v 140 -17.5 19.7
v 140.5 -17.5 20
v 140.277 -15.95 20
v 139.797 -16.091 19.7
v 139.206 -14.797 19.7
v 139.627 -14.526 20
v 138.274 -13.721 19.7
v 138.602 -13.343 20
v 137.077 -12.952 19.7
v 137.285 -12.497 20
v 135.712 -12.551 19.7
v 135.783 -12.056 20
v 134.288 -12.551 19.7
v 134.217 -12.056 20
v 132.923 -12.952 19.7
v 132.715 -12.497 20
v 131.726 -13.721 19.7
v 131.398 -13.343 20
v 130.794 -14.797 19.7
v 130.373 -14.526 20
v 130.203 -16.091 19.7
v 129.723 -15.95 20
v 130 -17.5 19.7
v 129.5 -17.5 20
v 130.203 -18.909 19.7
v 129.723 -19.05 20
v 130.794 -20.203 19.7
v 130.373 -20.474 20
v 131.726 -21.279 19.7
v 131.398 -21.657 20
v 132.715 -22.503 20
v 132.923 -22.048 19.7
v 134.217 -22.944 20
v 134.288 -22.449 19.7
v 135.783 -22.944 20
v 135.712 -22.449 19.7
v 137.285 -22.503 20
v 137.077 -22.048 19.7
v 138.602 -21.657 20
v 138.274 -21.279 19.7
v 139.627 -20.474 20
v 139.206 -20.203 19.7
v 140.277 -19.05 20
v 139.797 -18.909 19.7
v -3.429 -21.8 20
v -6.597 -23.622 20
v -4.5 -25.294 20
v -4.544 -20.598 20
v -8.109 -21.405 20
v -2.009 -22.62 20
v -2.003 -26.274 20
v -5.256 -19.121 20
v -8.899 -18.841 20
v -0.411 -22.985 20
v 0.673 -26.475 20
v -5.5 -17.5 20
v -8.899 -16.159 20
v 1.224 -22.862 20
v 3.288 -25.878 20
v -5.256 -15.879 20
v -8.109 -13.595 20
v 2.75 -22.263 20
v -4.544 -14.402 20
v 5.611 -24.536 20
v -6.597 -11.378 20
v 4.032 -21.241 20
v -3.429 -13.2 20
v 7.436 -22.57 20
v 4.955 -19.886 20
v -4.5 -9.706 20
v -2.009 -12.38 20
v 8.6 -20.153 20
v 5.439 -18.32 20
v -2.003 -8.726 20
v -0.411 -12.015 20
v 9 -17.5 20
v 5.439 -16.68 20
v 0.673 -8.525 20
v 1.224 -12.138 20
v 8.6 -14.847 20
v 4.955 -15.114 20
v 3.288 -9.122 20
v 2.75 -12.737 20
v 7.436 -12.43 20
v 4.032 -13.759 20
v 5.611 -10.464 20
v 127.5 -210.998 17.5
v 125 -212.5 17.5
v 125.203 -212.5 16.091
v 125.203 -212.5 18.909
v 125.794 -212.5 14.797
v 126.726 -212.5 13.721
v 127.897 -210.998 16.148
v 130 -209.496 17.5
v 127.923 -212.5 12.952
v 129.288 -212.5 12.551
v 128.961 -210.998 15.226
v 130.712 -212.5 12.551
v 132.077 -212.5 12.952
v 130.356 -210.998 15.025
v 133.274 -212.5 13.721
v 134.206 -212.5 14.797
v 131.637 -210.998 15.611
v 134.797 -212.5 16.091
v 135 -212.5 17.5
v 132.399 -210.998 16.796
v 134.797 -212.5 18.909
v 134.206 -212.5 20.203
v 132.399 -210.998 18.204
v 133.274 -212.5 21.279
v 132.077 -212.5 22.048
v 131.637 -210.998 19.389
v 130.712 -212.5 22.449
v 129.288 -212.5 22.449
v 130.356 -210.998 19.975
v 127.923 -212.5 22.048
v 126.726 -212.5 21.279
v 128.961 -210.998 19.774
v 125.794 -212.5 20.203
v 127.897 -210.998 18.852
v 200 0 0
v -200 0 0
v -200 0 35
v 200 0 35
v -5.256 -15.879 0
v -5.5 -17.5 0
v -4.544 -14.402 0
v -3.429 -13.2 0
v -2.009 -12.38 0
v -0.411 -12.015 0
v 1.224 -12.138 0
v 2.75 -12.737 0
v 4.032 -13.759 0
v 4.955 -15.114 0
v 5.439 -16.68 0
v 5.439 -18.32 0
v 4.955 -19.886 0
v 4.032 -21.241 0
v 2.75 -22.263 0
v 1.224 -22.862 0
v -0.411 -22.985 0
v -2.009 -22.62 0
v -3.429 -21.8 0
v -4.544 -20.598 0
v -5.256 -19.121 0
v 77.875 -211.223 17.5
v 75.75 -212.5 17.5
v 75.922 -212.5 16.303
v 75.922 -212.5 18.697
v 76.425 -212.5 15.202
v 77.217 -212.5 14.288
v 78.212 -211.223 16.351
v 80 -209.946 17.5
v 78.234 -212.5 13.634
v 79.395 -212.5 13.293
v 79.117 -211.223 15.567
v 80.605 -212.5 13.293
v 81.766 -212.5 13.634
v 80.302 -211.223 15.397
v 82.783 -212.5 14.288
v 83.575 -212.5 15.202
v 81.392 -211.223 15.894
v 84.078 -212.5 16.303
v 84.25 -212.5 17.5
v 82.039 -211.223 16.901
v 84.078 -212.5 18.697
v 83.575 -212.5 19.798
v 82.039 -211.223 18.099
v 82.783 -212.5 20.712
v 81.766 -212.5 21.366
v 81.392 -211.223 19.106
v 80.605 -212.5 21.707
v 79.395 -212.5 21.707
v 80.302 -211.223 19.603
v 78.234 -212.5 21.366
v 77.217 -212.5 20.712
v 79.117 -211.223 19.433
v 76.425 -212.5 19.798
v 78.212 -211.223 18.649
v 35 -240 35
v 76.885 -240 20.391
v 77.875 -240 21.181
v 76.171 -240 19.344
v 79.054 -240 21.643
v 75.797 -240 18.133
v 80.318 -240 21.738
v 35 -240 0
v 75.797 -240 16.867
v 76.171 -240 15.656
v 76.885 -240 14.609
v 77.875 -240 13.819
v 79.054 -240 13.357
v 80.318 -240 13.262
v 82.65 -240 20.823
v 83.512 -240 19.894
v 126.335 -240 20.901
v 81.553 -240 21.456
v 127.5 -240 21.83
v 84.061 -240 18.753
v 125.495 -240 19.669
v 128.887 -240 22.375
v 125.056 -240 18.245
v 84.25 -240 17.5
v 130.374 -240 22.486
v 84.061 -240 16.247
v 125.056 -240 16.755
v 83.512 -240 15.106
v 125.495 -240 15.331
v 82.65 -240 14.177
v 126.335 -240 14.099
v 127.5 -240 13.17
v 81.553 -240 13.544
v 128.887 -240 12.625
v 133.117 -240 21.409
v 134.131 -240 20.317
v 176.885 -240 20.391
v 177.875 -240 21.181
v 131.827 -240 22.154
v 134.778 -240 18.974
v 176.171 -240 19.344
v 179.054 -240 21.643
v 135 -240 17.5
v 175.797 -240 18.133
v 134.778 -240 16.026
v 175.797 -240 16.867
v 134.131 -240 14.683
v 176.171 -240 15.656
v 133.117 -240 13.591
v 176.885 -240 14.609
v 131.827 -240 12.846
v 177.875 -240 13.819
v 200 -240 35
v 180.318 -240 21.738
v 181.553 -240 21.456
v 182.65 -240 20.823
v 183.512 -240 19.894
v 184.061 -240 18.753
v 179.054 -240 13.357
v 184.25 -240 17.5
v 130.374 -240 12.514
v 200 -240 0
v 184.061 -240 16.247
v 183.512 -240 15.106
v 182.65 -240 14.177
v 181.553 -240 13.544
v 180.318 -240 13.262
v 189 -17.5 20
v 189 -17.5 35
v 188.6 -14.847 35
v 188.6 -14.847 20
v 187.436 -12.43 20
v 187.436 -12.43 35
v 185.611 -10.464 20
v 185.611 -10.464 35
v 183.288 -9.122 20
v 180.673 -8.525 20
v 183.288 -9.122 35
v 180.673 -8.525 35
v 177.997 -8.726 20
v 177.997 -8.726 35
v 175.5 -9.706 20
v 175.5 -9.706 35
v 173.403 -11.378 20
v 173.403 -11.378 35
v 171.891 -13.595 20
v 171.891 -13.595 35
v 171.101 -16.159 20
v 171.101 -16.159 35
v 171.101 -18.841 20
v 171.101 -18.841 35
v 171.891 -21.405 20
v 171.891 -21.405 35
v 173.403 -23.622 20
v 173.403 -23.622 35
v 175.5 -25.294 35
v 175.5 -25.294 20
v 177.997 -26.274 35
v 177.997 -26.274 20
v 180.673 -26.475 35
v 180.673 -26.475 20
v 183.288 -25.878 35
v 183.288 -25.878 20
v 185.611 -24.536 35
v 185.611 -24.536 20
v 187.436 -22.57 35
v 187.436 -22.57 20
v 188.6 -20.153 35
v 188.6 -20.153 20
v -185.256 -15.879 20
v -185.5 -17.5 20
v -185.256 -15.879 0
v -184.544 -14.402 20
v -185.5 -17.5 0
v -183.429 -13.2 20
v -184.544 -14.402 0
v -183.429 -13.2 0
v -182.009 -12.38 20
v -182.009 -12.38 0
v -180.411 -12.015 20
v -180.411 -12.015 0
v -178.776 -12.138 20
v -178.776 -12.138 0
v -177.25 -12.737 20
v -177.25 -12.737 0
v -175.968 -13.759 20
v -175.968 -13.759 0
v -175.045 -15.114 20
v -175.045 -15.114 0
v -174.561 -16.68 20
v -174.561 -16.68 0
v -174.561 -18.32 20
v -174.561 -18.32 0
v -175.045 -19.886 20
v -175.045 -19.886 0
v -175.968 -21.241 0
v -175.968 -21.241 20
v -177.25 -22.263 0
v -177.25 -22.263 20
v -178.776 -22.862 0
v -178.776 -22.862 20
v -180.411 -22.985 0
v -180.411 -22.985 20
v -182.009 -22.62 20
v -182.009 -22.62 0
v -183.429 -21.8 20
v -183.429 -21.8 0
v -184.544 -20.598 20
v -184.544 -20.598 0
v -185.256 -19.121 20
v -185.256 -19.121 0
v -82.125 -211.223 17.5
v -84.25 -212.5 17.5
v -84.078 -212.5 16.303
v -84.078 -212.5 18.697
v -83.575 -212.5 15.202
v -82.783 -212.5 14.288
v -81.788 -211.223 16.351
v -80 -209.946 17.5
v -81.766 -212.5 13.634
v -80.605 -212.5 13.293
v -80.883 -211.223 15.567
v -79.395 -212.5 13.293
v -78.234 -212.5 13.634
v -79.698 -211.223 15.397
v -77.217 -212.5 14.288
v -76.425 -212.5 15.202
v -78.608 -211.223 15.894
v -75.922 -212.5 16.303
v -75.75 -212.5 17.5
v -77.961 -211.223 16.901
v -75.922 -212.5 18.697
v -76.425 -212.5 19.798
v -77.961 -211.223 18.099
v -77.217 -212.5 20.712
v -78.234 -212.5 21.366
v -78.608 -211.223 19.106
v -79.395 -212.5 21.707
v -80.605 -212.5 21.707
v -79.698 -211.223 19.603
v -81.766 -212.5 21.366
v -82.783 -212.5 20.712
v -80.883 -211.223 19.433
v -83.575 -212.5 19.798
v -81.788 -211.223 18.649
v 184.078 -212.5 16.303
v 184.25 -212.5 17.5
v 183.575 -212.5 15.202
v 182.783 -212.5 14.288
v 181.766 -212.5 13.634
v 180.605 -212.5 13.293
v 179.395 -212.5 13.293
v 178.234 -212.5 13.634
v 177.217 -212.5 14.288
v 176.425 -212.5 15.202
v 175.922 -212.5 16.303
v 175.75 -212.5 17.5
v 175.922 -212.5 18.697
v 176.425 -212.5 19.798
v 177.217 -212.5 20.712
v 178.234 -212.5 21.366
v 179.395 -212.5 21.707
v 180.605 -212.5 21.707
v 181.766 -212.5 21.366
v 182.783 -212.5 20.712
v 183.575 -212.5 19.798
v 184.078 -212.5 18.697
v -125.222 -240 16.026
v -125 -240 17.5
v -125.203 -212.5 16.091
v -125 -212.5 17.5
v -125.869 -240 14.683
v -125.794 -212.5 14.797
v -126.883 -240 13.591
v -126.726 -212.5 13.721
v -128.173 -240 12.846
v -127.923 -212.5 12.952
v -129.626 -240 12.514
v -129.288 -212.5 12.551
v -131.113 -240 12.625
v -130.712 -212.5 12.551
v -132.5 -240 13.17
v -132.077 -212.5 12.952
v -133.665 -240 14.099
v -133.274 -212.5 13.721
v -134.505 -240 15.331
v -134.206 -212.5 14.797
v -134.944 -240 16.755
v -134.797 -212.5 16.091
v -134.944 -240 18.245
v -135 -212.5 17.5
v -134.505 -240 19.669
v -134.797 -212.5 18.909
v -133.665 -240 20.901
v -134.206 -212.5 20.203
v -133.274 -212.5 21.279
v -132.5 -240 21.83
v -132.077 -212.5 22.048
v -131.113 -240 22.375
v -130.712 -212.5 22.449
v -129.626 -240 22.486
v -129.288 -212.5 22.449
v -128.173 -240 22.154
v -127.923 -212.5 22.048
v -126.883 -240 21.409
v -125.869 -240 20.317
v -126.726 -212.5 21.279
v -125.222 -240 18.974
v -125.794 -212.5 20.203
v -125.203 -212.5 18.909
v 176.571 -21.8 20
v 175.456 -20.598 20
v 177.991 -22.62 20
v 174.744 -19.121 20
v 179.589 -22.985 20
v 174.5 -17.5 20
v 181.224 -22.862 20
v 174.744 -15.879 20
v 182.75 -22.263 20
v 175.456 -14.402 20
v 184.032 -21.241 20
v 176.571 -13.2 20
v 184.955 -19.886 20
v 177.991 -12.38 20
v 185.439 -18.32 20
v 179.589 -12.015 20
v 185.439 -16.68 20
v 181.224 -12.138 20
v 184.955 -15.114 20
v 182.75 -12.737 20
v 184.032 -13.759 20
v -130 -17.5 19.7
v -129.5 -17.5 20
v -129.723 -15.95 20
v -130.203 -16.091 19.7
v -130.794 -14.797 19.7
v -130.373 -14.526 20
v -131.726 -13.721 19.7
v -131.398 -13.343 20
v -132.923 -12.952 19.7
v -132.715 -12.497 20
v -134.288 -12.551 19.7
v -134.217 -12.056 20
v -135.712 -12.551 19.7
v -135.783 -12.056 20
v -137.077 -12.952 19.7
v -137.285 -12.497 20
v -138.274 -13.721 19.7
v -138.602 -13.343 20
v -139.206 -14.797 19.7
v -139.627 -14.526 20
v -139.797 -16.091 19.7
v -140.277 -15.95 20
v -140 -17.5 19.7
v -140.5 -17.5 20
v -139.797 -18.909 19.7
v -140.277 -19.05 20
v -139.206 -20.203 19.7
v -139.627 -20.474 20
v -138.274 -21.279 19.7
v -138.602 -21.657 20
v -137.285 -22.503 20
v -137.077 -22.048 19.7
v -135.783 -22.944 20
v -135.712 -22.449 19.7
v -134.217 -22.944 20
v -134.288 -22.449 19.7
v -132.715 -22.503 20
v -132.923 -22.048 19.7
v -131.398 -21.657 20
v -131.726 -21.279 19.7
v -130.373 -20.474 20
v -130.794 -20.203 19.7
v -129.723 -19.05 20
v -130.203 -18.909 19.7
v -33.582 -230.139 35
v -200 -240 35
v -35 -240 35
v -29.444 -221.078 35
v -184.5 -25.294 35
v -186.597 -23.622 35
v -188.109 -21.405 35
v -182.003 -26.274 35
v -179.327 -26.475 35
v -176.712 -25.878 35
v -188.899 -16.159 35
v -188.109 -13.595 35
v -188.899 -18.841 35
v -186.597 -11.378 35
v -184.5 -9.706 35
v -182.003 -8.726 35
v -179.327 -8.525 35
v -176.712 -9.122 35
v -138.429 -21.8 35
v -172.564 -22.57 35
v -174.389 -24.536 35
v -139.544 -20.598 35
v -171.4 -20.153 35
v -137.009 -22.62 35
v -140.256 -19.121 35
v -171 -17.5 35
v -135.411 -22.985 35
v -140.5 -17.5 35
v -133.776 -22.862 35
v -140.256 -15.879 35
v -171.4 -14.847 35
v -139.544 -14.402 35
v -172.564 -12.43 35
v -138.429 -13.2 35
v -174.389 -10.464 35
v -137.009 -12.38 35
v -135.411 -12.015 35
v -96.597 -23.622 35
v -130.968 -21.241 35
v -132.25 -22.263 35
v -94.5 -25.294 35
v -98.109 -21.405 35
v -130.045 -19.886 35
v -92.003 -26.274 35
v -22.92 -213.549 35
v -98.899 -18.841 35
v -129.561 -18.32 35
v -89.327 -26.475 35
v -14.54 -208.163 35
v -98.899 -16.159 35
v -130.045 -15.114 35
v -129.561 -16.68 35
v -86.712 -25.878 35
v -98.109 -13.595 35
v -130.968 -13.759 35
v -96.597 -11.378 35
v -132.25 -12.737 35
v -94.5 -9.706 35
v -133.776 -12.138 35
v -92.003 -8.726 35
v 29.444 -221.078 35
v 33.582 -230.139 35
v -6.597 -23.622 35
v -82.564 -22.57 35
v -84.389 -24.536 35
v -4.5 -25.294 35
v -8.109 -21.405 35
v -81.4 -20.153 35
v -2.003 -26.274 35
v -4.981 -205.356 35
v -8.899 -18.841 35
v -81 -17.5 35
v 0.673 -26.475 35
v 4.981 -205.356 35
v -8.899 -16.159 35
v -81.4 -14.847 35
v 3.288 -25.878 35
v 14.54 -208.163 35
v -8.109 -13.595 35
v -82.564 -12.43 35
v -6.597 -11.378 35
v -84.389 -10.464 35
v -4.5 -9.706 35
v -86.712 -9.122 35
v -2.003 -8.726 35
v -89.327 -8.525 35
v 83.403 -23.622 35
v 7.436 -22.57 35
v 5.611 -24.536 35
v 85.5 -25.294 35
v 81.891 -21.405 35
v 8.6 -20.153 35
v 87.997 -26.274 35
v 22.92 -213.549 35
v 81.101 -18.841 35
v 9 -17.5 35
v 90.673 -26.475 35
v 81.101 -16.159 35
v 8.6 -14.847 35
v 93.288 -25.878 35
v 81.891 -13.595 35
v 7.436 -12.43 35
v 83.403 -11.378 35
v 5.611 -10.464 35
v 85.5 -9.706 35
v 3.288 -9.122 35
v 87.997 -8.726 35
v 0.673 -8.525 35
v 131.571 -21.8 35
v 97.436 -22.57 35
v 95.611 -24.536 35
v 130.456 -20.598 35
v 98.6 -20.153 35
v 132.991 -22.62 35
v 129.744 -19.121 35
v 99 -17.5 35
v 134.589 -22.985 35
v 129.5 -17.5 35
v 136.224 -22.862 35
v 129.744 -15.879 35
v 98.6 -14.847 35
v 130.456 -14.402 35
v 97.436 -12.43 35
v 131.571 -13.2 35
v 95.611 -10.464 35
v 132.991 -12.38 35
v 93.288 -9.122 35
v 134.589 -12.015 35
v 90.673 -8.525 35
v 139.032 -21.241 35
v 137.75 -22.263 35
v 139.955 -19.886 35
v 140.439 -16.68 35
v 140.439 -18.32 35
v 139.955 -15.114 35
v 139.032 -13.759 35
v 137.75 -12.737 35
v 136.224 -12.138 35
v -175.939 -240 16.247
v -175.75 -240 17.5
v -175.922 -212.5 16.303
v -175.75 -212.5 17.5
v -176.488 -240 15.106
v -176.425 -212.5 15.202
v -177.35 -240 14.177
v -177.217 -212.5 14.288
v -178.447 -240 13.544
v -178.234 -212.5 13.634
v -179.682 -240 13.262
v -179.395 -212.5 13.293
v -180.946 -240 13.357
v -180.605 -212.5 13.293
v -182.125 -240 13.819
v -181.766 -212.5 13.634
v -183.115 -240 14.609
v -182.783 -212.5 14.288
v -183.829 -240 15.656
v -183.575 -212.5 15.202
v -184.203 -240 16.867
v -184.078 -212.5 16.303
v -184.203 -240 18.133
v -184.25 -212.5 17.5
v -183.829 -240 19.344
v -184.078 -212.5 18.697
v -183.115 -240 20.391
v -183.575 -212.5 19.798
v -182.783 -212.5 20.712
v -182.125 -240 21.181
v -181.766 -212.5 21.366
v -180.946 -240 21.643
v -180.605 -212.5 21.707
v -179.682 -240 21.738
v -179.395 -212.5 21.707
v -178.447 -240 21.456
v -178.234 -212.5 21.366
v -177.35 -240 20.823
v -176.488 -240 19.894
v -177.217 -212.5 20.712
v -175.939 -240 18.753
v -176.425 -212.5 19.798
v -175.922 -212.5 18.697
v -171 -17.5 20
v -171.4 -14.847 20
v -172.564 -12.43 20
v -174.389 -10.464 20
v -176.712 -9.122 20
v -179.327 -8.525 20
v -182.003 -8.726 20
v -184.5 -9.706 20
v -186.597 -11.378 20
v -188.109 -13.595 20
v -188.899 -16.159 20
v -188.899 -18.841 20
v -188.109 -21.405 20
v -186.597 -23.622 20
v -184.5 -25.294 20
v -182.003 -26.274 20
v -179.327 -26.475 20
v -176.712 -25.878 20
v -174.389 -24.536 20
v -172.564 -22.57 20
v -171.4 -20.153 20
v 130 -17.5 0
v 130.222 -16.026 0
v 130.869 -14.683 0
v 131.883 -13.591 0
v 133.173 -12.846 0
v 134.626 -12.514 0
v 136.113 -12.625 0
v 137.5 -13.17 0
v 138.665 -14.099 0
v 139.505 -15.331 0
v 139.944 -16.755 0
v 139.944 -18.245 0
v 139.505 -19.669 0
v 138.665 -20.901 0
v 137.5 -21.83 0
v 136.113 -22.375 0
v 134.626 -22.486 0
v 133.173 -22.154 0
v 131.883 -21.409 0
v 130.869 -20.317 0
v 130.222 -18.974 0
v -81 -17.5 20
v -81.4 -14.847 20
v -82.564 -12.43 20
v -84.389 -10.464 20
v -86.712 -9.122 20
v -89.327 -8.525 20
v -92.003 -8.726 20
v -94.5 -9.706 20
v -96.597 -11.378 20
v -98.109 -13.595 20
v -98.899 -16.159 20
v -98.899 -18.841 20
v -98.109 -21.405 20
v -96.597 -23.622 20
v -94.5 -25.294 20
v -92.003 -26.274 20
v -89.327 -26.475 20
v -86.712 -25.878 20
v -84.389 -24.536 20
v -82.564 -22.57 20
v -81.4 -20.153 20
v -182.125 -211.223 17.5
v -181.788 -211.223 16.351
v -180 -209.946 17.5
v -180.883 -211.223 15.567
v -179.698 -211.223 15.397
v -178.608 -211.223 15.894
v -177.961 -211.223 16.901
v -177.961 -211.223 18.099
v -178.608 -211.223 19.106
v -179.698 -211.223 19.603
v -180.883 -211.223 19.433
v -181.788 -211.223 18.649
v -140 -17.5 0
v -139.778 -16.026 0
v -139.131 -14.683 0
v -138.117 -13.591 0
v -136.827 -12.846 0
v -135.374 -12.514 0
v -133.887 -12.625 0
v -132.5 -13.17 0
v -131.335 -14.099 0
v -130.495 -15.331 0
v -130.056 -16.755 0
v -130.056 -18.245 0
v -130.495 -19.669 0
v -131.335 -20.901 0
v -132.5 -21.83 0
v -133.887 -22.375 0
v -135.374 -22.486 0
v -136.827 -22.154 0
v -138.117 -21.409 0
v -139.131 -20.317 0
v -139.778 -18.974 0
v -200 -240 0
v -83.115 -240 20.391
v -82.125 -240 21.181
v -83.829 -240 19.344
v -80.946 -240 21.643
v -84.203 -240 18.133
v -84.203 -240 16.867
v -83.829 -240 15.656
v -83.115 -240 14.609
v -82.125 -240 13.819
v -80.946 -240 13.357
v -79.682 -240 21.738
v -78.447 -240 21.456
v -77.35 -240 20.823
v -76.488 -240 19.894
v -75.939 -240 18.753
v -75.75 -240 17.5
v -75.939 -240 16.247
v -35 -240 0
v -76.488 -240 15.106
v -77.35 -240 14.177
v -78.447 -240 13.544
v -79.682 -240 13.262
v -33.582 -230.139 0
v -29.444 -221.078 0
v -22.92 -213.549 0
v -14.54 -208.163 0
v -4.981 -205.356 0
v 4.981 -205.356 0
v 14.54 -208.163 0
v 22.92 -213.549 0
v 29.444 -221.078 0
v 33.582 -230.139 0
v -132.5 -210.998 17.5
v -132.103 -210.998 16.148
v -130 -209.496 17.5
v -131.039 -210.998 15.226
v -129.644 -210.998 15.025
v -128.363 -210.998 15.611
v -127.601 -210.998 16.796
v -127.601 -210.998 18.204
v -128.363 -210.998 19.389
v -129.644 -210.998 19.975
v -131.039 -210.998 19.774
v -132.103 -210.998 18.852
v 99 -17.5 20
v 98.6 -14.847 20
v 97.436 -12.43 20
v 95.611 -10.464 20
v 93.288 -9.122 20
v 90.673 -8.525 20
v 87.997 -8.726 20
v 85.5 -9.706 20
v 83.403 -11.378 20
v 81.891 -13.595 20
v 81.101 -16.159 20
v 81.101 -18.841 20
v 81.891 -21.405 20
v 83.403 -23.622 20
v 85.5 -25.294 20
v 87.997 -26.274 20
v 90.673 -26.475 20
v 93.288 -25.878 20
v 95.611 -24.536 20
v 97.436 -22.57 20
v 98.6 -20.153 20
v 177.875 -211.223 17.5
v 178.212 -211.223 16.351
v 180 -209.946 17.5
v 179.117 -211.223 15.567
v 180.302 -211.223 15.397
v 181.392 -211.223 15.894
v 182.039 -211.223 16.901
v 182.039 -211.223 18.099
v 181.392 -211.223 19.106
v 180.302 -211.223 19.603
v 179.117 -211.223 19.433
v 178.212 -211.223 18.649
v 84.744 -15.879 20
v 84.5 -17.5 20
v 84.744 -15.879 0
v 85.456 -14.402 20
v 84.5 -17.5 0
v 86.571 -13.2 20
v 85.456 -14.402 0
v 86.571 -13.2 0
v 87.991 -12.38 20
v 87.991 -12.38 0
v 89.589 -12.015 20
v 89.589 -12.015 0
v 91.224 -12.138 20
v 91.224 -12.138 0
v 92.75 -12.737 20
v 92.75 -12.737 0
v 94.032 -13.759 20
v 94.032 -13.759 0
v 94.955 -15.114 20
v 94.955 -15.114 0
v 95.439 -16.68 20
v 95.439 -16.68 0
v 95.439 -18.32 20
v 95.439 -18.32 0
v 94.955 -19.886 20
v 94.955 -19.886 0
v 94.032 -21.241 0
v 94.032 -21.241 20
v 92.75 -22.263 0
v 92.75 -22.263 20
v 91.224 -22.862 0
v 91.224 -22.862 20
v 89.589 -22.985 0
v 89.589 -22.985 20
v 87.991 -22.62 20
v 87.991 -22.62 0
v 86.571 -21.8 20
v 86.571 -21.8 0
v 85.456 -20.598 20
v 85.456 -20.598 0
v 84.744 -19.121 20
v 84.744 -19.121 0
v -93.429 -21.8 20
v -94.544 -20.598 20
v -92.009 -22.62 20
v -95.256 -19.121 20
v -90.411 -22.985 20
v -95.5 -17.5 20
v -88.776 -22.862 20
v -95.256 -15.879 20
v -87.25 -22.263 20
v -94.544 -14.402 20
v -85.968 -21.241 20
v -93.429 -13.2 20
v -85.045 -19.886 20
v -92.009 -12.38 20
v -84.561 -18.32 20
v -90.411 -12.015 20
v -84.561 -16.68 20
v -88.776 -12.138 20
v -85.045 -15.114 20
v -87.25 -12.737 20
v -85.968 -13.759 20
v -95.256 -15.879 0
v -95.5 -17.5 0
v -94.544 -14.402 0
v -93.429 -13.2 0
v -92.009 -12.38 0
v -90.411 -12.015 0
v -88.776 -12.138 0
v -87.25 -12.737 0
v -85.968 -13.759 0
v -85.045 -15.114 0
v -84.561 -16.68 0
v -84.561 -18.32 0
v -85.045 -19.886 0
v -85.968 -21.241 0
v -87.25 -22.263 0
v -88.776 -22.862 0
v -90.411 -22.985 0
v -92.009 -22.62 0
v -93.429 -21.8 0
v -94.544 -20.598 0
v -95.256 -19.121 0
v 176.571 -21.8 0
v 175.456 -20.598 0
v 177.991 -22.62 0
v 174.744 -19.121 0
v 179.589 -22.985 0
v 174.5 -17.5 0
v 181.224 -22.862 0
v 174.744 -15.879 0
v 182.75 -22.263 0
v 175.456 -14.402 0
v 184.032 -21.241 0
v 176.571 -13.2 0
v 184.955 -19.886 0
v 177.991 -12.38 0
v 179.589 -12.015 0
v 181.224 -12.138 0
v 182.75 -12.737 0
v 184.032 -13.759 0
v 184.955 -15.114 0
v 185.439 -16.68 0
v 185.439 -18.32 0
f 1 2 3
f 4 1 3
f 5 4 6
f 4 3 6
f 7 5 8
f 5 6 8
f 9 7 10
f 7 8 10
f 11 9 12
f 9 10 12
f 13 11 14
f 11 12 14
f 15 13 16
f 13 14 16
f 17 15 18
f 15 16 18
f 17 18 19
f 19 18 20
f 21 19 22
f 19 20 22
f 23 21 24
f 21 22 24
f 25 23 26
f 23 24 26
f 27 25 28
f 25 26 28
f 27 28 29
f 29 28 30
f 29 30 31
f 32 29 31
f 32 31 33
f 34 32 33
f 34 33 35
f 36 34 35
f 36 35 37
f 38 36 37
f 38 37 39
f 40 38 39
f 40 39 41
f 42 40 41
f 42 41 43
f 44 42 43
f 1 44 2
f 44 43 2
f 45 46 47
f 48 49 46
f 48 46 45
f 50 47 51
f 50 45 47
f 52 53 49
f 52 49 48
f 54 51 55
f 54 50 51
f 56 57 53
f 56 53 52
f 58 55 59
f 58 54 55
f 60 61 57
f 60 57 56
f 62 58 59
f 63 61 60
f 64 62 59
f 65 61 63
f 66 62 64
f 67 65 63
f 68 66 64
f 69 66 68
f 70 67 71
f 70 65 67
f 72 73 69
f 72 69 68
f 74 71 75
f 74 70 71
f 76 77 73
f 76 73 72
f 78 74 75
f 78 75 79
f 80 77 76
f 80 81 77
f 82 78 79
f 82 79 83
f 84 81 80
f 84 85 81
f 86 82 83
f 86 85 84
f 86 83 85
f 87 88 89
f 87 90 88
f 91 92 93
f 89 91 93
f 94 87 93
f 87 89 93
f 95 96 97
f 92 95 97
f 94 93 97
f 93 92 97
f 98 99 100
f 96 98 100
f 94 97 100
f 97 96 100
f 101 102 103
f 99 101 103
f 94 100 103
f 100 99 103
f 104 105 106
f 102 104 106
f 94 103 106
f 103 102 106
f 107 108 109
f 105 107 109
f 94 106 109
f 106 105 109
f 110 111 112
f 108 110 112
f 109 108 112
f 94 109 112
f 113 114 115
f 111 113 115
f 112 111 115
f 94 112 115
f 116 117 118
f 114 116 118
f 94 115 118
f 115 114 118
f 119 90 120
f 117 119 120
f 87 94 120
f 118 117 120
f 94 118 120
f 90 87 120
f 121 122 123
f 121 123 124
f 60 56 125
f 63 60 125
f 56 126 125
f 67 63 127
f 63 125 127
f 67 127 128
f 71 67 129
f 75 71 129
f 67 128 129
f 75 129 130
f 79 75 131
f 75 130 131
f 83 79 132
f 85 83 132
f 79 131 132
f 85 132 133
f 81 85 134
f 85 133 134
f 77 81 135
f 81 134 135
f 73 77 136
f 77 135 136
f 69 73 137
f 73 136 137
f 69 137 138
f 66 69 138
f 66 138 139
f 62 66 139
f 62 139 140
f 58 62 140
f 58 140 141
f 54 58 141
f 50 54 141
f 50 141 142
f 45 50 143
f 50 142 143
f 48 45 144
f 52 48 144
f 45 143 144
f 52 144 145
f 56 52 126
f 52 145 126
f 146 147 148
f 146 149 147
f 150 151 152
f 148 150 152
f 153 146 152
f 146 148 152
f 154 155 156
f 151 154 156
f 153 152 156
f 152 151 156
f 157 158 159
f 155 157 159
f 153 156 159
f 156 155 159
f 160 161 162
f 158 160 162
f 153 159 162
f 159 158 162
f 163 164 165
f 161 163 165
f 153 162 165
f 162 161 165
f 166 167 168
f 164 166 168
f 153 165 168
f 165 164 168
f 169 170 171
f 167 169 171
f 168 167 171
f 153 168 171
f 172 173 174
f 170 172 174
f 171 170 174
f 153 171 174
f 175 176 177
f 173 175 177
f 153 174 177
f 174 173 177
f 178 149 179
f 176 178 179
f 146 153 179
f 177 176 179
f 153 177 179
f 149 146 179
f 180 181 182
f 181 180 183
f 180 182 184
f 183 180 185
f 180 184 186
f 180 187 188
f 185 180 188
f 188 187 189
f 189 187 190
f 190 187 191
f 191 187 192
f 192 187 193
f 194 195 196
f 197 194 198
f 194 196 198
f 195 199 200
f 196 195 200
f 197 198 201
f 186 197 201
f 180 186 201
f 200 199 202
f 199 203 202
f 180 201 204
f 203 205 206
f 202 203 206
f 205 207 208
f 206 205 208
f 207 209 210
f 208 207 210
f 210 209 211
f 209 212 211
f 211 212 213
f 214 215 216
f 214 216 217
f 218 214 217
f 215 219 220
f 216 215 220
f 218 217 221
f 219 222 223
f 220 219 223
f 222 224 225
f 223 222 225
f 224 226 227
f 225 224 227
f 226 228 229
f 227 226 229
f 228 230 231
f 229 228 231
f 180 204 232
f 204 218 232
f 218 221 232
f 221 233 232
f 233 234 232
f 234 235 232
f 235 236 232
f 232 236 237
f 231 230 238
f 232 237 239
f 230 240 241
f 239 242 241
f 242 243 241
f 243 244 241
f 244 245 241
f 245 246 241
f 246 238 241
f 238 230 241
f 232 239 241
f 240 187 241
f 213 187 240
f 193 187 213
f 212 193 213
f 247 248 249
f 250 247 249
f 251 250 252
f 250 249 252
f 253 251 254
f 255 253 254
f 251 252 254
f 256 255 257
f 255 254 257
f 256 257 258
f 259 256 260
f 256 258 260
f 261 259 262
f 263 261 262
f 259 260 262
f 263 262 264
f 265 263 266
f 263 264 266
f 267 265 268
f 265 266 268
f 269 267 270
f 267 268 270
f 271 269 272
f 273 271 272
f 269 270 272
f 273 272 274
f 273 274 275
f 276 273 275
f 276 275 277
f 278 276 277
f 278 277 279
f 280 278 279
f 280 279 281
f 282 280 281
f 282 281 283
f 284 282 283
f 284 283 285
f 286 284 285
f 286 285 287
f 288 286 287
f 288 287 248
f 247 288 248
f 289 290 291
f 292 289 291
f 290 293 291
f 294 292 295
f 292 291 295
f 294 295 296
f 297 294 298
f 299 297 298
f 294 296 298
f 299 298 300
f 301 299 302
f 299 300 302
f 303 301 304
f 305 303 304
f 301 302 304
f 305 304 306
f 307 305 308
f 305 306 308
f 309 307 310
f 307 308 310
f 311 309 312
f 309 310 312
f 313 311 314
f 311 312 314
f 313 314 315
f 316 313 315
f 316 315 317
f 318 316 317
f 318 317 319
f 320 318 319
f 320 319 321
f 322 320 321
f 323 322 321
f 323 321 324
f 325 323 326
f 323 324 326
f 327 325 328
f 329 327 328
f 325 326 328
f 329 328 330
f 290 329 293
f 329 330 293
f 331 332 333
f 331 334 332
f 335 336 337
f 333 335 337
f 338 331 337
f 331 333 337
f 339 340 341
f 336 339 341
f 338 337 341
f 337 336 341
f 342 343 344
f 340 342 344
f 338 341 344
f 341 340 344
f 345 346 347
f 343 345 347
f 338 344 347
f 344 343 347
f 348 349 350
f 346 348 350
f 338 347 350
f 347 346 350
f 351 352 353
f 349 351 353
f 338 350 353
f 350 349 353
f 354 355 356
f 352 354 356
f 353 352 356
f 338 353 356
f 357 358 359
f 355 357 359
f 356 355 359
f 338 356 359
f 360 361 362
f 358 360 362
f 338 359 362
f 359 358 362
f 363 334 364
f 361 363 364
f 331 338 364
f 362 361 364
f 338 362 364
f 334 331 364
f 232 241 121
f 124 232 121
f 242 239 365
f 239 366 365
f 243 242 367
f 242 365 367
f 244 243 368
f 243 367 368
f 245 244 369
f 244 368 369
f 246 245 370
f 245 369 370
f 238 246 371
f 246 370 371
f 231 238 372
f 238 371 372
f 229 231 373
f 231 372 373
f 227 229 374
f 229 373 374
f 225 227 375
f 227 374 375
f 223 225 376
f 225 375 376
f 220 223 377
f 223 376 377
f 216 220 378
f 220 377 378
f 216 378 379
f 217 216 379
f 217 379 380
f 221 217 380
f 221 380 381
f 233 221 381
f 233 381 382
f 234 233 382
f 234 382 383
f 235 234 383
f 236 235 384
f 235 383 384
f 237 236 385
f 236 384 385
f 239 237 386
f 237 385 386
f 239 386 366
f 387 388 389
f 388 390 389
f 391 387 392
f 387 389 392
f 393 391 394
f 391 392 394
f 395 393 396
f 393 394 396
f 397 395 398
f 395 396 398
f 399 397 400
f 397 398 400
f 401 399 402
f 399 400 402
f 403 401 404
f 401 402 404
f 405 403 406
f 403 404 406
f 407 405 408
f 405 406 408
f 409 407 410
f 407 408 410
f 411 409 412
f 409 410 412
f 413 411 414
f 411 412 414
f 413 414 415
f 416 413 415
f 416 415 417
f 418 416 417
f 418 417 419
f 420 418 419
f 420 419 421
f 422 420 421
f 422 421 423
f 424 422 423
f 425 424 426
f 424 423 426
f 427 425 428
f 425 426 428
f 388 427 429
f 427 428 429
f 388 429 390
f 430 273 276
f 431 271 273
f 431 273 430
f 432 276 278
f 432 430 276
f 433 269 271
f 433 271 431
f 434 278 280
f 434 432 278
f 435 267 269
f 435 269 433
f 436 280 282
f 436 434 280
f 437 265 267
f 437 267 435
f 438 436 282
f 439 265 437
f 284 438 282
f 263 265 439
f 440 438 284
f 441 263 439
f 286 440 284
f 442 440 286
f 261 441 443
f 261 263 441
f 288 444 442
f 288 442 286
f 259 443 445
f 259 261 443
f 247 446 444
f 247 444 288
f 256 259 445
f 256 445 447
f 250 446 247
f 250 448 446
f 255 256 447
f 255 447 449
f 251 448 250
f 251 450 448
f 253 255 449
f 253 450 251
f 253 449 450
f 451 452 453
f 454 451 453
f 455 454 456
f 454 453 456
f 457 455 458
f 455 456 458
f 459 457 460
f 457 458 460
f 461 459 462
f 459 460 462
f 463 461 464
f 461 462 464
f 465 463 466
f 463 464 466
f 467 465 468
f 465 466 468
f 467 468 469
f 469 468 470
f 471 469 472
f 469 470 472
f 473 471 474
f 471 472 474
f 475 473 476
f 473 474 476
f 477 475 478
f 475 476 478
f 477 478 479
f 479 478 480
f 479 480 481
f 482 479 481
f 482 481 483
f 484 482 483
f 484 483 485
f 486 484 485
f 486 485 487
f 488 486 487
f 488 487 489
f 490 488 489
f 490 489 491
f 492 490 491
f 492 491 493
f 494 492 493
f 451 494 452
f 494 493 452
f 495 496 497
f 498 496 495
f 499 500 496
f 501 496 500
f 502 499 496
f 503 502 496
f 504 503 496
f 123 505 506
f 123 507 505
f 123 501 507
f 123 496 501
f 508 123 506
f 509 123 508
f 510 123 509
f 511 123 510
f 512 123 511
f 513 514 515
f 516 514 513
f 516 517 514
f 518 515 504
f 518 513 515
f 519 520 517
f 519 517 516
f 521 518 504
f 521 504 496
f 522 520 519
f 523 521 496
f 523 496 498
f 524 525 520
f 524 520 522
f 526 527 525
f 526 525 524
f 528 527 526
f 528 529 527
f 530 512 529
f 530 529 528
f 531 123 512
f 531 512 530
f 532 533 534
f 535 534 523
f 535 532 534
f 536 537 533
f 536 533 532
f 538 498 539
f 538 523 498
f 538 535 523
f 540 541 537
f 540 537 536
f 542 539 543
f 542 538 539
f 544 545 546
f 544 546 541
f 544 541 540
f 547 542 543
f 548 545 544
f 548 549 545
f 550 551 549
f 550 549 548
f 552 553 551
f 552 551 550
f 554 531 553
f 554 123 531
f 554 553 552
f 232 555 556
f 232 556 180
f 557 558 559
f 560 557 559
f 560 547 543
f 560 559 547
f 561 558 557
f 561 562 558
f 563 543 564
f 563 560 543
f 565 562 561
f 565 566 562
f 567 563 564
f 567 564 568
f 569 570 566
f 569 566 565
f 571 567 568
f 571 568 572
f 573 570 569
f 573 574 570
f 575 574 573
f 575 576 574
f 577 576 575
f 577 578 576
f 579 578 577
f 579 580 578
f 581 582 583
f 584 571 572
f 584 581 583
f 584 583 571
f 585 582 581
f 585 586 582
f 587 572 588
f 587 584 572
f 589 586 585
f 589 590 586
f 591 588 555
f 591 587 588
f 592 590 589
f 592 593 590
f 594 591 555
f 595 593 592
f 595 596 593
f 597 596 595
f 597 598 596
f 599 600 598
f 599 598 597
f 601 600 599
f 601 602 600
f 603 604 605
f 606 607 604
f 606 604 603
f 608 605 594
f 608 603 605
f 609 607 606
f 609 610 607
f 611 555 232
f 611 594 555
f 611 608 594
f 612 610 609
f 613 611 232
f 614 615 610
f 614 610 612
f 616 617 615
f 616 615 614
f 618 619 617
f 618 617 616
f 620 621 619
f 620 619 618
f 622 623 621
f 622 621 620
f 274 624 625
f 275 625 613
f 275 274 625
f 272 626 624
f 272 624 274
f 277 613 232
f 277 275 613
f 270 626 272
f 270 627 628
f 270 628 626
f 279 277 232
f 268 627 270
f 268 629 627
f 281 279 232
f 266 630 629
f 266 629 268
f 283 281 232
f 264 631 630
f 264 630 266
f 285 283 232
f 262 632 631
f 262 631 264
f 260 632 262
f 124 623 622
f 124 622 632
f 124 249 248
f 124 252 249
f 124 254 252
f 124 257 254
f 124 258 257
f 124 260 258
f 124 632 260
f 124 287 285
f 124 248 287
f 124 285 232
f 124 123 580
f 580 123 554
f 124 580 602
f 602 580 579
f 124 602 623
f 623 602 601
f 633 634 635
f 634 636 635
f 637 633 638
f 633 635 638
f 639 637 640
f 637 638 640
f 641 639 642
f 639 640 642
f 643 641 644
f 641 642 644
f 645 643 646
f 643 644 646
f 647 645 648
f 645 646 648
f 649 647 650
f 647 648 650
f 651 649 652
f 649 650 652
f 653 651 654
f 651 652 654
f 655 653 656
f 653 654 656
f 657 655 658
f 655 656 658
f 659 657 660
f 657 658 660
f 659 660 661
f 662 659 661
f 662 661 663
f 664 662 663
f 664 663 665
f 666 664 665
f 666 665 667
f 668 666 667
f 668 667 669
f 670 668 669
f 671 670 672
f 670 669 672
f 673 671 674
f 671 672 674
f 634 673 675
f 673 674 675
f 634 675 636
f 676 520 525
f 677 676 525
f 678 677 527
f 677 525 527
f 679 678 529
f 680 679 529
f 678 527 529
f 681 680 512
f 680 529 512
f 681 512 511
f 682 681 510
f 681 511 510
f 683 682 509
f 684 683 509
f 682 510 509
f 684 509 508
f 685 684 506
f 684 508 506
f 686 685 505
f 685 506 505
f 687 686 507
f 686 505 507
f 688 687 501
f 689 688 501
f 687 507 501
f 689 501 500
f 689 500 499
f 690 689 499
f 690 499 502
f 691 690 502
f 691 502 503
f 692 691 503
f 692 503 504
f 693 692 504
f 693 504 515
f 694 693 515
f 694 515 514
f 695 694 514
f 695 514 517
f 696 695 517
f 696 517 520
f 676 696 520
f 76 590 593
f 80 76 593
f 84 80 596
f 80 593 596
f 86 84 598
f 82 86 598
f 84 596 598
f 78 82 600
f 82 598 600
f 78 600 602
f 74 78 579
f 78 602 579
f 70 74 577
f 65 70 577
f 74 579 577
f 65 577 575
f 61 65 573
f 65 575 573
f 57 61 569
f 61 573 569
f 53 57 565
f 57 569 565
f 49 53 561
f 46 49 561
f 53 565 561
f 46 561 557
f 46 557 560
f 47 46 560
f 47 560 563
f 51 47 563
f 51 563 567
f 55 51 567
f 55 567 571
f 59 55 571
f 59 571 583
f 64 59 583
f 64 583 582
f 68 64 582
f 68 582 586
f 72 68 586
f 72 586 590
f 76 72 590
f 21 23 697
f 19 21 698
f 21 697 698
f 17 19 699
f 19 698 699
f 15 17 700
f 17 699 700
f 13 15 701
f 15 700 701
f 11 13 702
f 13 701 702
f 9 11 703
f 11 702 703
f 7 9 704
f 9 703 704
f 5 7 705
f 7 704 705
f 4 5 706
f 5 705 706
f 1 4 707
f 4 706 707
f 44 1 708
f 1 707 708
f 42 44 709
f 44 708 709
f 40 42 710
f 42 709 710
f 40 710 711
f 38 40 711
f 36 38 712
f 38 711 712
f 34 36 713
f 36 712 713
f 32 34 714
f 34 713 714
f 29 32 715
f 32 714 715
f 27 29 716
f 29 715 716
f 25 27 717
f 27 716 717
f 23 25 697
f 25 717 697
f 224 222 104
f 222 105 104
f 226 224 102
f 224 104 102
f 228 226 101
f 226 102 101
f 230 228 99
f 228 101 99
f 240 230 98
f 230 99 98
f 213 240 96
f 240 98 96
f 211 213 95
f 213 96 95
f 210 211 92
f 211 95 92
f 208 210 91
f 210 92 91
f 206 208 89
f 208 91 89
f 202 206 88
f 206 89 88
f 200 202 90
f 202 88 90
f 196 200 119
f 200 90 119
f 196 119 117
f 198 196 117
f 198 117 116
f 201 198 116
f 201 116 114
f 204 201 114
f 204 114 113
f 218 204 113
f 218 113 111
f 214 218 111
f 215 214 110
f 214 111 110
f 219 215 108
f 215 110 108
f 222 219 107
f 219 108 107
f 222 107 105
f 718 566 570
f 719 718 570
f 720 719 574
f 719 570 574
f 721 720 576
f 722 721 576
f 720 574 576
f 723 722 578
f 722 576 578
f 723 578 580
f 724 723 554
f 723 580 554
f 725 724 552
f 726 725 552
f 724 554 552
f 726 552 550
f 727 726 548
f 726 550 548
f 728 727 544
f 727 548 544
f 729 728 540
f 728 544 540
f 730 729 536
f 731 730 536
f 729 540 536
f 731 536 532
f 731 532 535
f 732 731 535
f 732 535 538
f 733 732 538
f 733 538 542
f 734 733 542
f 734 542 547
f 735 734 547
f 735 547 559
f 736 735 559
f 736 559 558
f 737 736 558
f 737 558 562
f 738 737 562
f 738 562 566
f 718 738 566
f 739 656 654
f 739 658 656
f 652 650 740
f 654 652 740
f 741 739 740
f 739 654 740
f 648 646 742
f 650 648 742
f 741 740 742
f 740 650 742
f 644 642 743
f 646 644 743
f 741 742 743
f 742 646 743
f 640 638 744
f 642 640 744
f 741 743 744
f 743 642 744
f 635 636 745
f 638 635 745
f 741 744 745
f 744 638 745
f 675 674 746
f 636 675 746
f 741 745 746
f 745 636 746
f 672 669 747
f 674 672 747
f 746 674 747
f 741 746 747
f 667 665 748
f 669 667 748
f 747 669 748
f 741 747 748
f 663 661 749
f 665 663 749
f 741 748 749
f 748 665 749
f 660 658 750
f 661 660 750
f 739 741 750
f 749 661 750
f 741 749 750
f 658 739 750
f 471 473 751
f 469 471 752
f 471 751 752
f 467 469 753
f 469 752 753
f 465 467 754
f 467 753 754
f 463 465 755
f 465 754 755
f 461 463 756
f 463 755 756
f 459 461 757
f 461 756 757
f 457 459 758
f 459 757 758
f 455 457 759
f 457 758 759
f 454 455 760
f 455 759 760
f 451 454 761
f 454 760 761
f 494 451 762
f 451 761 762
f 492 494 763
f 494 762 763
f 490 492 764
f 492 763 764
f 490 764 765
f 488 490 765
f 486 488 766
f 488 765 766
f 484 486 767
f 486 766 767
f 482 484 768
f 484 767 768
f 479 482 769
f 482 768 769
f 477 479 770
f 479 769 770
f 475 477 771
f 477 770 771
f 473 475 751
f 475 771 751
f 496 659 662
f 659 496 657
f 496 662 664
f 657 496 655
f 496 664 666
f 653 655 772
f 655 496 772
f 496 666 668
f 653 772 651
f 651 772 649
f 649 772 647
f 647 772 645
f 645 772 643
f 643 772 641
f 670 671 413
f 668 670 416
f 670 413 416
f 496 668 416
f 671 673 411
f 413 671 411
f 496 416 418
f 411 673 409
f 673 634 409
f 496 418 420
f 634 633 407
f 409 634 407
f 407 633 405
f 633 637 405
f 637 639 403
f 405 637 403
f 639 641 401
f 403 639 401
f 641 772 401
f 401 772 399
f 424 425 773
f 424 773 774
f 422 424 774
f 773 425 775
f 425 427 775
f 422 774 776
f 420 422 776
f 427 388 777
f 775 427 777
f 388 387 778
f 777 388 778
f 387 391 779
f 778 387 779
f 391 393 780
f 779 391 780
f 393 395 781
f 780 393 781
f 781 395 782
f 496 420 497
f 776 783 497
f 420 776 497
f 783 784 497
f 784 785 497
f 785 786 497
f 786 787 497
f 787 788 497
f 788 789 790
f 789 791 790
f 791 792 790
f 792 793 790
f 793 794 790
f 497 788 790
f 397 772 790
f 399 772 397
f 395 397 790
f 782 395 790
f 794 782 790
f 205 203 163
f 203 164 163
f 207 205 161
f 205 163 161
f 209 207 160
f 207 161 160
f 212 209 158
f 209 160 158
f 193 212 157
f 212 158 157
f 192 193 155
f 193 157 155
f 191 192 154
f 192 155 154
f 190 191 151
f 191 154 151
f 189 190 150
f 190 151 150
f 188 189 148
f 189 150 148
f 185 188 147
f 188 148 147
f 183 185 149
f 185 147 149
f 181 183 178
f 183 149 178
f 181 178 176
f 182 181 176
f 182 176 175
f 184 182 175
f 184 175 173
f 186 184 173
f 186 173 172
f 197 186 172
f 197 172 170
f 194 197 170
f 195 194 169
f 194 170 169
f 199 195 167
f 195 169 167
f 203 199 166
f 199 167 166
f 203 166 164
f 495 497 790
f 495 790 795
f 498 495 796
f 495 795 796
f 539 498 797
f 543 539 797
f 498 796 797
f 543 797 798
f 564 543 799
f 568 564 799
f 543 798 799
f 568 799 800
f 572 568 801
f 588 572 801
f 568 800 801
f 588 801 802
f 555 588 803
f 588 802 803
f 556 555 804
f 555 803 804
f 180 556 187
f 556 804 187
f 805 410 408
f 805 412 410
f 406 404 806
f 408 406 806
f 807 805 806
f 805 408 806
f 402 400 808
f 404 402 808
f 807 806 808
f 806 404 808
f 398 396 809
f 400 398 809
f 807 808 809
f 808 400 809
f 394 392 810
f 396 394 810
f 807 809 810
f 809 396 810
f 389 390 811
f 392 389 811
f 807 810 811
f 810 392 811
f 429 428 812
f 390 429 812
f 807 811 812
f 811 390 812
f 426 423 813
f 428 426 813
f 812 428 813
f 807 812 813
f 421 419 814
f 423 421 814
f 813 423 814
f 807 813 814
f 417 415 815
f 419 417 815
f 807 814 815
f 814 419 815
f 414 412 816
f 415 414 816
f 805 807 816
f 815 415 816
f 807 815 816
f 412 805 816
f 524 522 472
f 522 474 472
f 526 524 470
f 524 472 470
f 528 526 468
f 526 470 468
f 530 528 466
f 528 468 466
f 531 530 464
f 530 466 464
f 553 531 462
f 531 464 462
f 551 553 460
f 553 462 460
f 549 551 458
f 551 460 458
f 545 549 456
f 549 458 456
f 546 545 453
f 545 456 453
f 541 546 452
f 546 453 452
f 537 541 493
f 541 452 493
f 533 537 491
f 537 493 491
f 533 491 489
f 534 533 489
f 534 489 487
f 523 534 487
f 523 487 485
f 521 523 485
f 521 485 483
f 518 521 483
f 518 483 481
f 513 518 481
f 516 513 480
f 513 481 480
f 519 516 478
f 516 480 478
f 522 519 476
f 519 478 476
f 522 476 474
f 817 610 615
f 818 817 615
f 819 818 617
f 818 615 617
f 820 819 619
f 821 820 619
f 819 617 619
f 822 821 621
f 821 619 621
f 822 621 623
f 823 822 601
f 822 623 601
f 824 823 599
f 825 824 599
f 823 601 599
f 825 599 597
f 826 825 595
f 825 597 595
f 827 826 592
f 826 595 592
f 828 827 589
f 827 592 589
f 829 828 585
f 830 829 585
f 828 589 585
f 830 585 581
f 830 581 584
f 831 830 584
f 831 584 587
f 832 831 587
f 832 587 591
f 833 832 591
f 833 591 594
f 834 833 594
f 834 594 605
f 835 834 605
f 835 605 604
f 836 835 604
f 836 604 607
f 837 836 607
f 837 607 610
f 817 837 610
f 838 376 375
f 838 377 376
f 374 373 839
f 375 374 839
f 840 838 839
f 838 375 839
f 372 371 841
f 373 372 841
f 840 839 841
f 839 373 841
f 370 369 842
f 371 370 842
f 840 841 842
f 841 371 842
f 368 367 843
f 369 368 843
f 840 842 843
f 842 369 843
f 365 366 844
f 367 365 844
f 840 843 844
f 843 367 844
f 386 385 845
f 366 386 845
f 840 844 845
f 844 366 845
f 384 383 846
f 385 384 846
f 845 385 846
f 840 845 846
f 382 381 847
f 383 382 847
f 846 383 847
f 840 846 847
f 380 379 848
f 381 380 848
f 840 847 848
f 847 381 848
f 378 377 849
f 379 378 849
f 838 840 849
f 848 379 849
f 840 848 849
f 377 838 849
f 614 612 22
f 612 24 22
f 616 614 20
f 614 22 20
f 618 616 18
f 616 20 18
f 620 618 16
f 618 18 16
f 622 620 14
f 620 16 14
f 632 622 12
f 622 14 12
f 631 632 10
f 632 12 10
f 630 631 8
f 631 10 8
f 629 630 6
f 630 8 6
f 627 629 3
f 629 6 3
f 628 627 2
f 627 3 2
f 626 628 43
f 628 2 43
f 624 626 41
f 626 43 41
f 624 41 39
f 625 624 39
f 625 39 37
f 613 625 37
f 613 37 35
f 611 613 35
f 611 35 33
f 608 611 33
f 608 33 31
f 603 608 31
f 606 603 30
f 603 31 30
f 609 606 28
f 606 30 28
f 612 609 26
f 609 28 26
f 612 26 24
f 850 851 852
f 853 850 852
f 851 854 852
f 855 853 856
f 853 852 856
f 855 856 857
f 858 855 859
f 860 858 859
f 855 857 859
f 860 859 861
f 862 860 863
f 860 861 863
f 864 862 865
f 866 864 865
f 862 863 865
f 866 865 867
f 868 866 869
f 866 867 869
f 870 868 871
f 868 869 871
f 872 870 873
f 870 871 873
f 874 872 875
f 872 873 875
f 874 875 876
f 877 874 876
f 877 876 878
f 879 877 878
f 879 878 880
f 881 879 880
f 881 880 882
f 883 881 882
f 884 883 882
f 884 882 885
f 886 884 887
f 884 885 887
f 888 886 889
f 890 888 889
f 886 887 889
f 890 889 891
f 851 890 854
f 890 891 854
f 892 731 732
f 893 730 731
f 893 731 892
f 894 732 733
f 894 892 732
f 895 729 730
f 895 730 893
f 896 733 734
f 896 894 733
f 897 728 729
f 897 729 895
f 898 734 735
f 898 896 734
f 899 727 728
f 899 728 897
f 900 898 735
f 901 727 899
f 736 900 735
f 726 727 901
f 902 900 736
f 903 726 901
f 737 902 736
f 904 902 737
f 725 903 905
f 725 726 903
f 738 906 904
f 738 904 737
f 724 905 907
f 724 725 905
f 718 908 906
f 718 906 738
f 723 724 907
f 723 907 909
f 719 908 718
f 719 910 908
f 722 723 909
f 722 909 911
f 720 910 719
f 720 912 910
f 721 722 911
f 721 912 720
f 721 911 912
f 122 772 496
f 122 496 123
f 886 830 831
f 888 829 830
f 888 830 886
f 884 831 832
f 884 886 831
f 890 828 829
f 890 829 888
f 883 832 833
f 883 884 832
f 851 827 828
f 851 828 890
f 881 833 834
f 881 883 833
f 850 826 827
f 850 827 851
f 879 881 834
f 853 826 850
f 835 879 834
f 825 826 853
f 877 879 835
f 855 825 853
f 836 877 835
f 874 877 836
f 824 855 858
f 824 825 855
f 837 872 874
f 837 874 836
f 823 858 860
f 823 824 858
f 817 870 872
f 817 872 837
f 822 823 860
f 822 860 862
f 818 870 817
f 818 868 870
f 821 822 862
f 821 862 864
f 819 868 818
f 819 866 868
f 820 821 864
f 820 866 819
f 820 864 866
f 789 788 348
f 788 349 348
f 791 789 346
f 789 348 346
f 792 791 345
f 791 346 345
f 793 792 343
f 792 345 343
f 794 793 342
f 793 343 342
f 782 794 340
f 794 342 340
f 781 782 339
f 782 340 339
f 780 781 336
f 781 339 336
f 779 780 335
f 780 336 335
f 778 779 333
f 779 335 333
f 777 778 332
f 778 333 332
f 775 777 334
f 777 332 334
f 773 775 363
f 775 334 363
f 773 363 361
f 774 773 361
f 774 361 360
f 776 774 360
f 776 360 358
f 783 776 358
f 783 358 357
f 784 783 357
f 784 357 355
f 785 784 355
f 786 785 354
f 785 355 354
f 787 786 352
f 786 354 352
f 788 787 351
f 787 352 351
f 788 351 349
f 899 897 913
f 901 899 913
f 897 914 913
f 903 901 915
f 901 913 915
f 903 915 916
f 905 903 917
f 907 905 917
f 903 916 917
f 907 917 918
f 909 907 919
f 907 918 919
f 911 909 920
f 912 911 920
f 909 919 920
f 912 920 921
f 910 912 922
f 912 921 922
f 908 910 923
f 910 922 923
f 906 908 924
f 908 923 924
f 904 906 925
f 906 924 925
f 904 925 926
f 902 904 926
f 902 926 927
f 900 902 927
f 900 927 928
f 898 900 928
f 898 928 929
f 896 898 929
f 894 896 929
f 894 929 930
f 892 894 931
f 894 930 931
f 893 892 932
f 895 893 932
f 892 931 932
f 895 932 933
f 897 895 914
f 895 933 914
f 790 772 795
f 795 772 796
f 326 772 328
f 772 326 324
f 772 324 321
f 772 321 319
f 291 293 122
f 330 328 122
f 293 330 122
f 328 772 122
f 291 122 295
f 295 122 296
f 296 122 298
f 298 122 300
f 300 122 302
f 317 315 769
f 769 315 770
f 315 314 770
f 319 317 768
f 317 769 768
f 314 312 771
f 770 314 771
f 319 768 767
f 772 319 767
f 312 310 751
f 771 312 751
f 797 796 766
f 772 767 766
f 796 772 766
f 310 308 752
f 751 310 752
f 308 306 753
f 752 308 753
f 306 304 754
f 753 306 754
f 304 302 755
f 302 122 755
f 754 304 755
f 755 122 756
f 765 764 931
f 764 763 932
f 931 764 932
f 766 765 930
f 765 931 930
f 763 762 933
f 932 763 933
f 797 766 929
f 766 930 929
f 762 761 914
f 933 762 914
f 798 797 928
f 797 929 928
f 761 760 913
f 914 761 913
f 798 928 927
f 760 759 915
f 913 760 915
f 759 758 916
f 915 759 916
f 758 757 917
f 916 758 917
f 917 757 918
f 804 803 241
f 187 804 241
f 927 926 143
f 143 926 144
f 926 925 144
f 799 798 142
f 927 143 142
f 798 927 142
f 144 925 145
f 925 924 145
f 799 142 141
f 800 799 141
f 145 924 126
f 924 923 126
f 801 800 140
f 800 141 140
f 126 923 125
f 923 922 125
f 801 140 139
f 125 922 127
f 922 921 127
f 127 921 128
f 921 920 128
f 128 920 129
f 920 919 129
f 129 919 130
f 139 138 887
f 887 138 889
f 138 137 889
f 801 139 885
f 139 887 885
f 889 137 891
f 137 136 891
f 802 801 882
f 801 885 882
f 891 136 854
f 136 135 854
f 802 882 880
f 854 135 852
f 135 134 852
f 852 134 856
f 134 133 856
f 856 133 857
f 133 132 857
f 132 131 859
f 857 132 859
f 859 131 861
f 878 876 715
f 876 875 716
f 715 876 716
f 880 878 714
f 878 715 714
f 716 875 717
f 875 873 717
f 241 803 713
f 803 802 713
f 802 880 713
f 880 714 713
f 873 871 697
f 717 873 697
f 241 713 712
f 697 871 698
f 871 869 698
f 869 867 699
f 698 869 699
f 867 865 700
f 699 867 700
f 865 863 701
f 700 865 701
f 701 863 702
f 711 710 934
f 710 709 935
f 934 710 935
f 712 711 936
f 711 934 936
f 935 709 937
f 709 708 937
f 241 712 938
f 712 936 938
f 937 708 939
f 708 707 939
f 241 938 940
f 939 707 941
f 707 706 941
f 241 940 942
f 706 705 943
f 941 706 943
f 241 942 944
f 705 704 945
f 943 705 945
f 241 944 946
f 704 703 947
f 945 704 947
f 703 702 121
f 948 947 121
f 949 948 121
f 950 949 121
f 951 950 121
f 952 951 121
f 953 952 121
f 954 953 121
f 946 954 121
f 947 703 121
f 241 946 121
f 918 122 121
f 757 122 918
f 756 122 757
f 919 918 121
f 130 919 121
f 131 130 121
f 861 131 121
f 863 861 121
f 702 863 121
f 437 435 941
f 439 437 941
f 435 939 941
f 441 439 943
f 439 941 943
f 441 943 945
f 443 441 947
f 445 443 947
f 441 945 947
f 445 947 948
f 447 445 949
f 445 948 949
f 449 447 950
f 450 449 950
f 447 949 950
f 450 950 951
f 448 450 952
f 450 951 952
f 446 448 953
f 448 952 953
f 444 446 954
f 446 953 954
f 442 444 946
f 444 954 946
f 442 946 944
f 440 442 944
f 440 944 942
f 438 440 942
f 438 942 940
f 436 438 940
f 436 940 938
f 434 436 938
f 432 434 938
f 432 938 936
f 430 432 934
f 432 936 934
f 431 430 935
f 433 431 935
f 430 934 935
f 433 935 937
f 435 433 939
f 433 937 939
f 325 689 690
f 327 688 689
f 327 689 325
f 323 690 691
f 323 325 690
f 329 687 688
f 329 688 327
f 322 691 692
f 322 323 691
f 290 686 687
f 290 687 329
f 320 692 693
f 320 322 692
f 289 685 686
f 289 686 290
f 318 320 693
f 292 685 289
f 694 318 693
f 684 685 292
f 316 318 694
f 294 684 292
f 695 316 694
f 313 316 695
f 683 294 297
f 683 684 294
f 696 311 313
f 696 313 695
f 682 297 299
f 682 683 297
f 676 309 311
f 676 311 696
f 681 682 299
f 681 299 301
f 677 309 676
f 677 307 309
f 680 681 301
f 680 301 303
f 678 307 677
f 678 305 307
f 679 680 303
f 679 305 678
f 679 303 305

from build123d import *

# Parameters (mm, degrees)
ESBO_O1_W                                            = 400
ESBO_O1_H                                            = 240
RESSALTO_EXTRUS_O1_DEPTH                             = 35
ESBO_O2_R                                            = 35
CORTE_EXTRUS_O1_DEPTH                                = 315.364438192
FURO_ROSCADO_DE_M101_D                               = 8.5
FURO_ROSCADO_DE_M101_DEPTH                           = 27.5
FURO_ROSCADO_DE_M101_TIP                             = 2.553657631
FUROS_GUIA_COM_10_0MM1_D                             = 10
FUROS_GUIA_COM_10_0MM1_DEPTH                         = 27.5
FUROS_GUIA_COM_10_0MM1_TIP                           = 3.004303095
REBAIXO_PARA_PARAFUSO_ALLEN_SEXTAVADO_DE_D           = 11
REBAIXO_PARA_PARAFUSO_ALLEN_SEXTAVADO_DE_CBORE_D     = 18
REBAIXO_PARA_PARAFUSO_ALLEN_SEXTAVADO_DE_CBORE_DEPTH = 15
FUROS_GUIA_COM_10_0MM2_D                             = 10
FURO_DE_DI_METRO_11_0_11_1_D                         = 11
FURO_DE_DI_METRO_11_0_11_1_DEPTH                     = 15
FURO_DE_DI_METRO_11_0_11_1_TIP                       = 3.304733405


with BuildPart() as part:
    # Esboço1 → Ressalto-extrusão1 (new body)
    with BuildSketch(Plane.XY):
        with Locations((0, -120)):
            Rectangle(ESBO_O1_W, ESBO_O1_H)
    extrude(amount=RESSALTO_EXTRUS_O1_DEPTH)

    # Esboço2 → Corte-extrusão1 (cut, through all)
    with BuildSketch(Plane(origin=(0, 0, 0), x_dir=(-1, 0, 0), z_dir=(0, 0, -1))):
        with Locations((0, -240)):
            Circle(ESBO_O2_R)
    extrude(amount=-CORTE_EXTRUS_O1_DEPTH, mode=Mode.SUBTRACT)

    # Furo roscado de M101
    with Locations(Plane(origin=(0, -240, 0), x_dir=(-1, 0, 0), z_dir=(0, -1, 0))):
        with Locations((-180, -17.5), (-80, -17.5), (80, -17.5), (180, -17.5)):
            Hole(FURO_ROSCADO_DE_M101_D / 2, depth=FURO_ROSCADO_DE_M101_DEPTH)
            with Locations((0, 0, -(FURO_ROSCADO_DE_M101_DEPTH + FURO_ROSCADO_DE_M101_TIP / 2))):  # 118° drill point
                Cone(0, FURO_ROSCADO_DE_M101_D / 2, FURO_ROSCADO_DE_M101_TIP, mode=Mode.SUBTRACT)

    # Furos-guia com Ø10.0mm1
    with Locations(Plane(origin=(0, -240, 0), x_dir=(-1, 0, 0), z_dir=(0, -1, 0))):
        with Locations((-130, -17.5), (130, -17.5)):
            Hole(FUROS_GUIA_COM_10_0MM1_D / 2, depth=FUROS_GUIA_COM_10_0MM1_DEPTH)
            with Locations((0, 0, -(FUROS_GUIA_COM_10_0MM1_DEPTH + FUROS_GUIA_COM_10_0MM1_TIP / 2))):  # 118° drill point
                Cone(0, FUROS_GUIA_COM_10_0MM1_D / 2, FUROS_GUIA_COM_10_0MM1_TIP, mode=Mode.SUBTRACT)

    # Rebaixo para parafuso Allen sextavado de M101 (through all)
    with Locations(Plane.XY.offset(35)):
        with Locations((180, -17.5), (90, -17.5), (0, -17.5), (-90, -17.5), (-180, -17.5)):
            CounterBoreHole(REBAIXO_PARA_PARAFUSO_ALLEN_SEXTAVADO_DE_D / 2, REBAIXO_PARA_PARAFUSO_ALLEN_SEXTAVADO_DE_CBORE_D / 2, REBAIXO_PARA_PARAFUSO_ALLEN_SEXTAVADO_DE_CBORE_DEPTH)

    # Furos-guia com Ø10.0mm2 (through all)
    with Locations(Plane.XY.offset(35)):
        with Locations((135, -17.5), (-135, -17.5)):
            Hole(FUROS_GUIA_COM_10_0MM2_D / 2)

    # Furo de diâmetro Ø11.0 (11)1
    with Locations(Plane.XY.offset(35)):
        with Locations((135, -17.5), (-135, -17.5)):
            Hole(FURO_DE_DI_METRO_11_0_11_1_D / 2, depth=FURO_DE_DI_METRO_11_0_11_1_DEPTH)
            with Locations((0, 0, -(FURO_DE_DI_METRO_11_0_11_1_DEPTH + FURO_DE_DI_METRO_11_0_11_1_TIP / 2))):  # 118° drill point
                Cone(0, FURO_DE_DI_METRO_11_0_11_1_D / 2, FURO_DE_DI_METRO_11_0_11_1_TIP, mode=Mode.SUBTRACT)


solid = part.part
